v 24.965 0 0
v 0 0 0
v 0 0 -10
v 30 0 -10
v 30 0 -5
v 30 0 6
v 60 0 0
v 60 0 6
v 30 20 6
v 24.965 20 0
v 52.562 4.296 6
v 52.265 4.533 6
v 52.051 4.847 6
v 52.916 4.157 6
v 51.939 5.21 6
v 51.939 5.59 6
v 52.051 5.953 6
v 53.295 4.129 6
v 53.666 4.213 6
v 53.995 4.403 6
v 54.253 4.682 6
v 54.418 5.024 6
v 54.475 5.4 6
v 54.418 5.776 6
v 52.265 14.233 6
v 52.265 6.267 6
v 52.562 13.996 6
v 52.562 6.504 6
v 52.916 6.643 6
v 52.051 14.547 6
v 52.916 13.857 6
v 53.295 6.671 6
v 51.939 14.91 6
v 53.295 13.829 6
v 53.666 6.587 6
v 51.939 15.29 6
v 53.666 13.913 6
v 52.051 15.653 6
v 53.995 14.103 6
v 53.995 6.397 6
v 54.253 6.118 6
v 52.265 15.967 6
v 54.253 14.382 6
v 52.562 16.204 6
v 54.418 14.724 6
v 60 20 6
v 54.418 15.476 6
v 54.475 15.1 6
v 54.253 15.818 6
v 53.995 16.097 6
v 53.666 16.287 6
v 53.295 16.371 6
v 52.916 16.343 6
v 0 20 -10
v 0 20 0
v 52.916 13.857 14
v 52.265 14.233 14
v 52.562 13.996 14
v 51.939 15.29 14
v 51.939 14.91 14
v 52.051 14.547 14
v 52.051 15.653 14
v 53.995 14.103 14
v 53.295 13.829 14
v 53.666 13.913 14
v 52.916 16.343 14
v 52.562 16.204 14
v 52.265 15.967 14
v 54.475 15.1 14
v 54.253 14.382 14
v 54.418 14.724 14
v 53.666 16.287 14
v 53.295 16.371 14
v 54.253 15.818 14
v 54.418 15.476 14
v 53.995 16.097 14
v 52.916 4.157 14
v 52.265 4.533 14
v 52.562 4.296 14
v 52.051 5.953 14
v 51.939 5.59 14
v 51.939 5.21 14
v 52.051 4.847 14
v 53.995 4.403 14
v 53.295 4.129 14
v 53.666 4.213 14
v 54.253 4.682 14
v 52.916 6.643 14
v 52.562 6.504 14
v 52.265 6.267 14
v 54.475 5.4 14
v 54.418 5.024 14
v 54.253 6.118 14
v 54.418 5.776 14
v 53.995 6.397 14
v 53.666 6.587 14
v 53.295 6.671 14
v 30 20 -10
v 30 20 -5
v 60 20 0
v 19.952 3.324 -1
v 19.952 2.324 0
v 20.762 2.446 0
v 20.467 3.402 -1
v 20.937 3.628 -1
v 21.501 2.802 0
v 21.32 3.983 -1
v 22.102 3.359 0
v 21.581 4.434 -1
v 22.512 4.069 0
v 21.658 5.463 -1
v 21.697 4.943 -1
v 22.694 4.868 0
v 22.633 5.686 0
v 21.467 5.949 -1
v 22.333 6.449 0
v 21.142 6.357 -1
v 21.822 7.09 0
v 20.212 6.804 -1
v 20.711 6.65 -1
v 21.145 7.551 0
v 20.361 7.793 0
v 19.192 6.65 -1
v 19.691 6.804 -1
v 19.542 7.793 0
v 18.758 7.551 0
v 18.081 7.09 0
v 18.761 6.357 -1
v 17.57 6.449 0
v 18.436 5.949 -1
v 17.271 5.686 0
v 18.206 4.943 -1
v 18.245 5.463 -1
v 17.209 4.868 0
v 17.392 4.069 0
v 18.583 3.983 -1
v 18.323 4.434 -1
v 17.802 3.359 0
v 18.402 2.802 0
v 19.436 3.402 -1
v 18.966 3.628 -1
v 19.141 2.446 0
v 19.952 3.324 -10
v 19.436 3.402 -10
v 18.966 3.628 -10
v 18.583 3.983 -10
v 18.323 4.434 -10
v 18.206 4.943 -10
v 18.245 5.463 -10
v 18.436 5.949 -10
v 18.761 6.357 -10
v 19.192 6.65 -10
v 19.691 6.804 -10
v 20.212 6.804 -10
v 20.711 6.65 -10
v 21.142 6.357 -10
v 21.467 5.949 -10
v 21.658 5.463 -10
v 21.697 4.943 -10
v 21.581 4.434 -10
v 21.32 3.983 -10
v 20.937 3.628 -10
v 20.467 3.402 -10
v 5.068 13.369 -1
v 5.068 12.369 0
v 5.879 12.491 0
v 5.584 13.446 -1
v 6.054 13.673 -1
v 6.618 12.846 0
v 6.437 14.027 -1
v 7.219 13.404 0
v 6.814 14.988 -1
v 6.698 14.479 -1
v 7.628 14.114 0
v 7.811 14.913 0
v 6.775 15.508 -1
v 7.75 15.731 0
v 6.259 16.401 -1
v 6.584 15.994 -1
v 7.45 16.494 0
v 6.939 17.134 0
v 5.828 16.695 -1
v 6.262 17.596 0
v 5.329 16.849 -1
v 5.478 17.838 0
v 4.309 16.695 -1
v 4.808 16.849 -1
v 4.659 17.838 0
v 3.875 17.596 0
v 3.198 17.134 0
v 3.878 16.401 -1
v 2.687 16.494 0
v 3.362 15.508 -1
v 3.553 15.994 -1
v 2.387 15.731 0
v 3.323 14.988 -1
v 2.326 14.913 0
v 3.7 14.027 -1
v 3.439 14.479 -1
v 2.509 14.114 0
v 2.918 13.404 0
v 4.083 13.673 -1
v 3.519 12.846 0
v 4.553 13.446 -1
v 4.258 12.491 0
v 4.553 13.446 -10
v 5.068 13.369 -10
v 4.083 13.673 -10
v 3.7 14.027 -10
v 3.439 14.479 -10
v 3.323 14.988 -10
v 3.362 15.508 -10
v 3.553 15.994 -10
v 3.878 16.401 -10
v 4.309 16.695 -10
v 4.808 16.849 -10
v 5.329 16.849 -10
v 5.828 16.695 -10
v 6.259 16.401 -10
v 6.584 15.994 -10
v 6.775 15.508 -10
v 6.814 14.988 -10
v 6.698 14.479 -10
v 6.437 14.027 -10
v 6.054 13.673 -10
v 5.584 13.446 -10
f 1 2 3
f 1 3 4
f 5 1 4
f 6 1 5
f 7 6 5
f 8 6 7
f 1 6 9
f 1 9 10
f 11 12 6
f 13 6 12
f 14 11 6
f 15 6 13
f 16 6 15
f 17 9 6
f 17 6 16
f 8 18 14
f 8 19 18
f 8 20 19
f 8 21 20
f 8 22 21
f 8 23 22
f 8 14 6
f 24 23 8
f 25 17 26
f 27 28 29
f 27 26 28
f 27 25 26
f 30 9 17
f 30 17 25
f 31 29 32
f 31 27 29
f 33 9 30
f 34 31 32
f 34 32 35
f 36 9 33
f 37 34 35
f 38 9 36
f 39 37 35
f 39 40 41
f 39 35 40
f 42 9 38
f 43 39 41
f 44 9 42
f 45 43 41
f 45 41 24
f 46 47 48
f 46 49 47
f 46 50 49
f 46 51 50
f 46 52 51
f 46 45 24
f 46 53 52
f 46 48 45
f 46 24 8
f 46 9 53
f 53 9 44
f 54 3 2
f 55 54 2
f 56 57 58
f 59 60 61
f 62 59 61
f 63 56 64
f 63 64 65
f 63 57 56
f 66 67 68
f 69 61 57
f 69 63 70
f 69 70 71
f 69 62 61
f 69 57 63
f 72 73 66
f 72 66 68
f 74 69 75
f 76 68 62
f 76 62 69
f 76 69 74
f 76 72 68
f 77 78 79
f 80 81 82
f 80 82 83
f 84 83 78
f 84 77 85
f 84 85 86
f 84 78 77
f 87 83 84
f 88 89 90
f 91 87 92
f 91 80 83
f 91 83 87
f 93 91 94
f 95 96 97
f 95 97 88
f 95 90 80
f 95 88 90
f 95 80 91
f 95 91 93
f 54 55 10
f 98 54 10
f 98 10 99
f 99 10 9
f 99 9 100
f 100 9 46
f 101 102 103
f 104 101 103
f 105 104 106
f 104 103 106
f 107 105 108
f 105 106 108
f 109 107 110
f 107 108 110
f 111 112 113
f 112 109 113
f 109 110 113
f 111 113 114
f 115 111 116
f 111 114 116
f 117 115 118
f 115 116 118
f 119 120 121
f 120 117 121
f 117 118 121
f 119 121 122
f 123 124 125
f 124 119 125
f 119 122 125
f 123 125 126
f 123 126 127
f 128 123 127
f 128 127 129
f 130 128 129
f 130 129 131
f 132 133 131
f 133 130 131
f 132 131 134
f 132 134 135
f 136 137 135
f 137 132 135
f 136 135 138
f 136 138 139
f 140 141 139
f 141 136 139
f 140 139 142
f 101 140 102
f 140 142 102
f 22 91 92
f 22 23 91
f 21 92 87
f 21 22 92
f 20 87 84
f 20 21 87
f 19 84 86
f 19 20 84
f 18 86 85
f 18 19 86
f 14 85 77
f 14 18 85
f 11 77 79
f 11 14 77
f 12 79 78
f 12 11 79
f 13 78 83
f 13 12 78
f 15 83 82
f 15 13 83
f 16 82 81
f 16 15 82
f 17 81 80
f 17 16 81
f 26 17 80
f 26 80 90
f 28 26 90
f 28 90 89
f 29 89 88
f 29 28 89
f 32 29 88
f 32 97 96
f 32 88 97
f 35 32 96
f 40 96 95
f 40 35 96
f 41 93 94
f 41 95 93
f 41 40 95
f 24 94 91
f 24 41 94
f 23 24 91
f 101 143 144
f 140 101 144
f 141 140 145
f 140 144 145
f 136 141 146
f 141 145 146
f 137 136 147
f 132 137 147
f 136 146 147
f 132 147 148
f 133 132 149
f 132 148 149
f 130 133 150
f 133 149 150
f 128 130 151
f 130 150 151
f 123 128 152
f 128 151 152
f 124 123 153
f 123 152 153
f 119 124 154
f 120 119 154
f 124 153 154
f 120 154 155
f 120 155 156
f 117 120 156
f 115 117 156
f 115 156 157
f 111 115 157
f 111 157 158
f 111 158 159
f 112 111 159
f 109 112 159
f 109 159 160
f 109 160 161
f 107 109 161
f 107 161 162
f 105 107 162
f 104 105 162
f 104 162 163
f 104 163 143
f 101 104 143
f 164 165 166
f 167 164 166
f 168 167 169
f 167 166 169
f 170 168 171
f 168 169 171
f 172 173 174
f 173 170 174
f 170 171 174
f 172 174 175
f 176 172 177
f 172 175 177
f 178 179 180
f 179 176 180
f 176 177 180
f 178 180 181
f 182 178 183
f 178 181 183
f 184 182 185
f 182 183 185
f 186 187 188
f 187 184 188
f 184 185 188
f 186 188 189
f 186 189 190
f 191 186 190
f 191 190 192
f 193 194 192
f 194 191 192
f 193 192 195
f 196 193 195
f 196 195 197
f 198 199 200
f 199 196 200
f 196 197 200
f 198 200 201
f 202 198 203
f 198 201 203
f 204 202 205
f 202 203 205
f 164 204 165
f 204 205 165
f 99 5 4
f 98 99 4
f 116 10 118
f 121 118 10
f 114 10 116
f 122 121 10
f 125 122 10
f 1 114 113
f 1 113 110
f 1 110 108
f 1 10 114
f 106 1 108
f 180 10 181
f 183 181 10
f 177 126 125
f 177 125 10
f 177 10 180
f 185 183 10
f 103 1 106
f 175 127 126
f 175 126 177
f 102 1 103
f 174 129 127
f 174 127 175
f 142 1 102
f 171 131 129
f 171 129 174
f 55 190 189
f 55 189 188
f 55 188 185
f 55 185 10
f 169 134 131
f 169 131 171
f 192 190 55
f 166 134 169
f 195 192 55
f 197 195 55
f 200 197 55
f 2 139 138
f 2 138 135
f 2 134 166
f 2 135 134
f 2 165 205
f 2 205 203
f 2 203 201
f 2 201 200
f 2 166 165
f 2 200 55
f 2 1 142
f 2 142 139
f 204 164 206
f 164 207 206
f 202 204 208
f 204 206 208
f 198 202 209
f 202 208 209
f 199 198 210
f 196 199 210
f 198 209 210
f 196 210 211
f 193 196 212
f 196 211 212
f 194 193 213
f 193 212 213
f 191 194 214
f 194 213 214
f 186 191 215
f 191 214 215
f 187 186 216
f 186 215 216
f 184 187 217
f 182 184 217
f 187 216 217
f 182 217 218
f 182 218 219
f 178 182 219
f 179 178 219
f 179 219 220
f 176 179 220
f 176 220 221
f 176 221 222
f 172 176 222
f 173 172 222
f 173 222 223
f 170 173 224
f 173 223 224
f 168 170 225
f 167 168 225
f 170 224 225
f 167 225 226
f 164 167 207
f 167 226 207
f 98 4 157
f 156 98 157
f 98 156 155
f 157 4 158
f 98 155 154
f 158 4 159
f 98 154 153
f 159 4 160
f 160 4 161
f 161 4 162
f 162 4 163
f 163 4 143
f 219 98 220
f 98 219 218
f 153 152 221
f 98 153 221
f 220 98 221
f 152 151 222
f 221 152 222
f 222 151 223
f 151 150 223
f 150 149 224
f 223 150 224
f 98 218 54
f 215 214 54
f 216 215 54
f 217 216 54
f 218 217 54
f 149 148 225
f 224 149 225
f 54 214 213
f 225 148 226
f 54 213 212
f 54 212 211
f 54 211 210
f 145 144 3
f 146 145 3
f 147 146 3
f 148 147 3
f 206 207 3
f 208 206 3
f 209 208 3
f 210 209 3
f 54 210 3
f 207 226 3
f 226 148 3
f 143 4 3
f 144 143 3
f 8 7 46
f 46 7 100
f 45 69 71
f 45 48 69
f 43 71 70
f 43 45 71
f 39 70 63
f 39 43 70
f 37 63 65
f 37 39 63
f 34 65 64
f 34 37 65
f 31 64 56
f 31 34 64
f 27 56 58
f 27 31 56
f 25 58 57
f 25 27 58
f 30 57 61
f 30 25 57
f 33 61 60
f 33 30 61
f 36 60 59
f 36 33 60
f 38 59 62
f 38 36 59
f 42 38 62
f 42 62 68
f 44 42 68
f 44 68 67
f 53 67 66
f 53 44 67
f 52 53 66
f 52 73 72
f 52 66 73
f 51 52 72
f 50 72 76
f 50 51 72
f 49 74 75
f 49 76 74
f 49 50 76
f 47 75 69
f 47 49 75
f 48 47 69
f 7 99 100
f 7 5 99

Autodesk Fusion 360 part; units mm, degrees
sketch "Skizze1" plane through (0, 0, 0) normal (0, 0, 1) x (1, 0, 0)
  line L0 (0, 0) -> (60, 0)
  line L1 (60, 0) -> (60, 20)
  line L2 (60, 20) -> (0, 20)
  line L3 (0, 20) -> (0, 0)
  circle A0 centre (53.2, 5.4) radius 1.275
  circle A1 centre (53.2, 15.1) radius 1.275
  line L4 (0, 20) -> (30, 20)
  line L5 (30, 20) -> (30, 0)
  line L6 (30, 0) -> (0, 0)
  line L7 (0, 0) -> (0, 20)
  dimension "d1" = 60
  dimension "d2" = 20
  dimension "d3" = 2.55
  dimension "d4" = 2.55
  dimension "d5" = 5.4
  dimension "d6" = 6.8
  dimension "d7" = 4.9
  dimension "d8" = 6.8
extrude "Extrusion1" add sketch "Skizze1" along normal blind 6
extrude "Extrusion2" add sketch "Skizze1" along normal blind 14 contours A0 | A1
extrude "Extrusion3" add sketch "Skizze1" against normal blind 5 contours L0 L2 L3 L4 L5 L6 L7
sketch "Skizze2" plane through (0, 0, 0) normal (0, -1, 0) x (1, 0, 0)
  line L0 (30, 0) -> (60, 0)
  line L1 (60, 0) -> (60, 6)
  line L2 (60, 6) -> (0, 6)
  line L3 (0, 6) -> (0, -5)
  line L4 (0, -5) -> (30, -5)
  line L5 (30, -5) -> (30, 0)
  line L6 (30, -5) -> (60, 0)
  line L7 (0, 6) -> (30, 6)
  line L8 (30, 6) -> (30, 0)
  line L9 (30, 0) -> (0, 0)
  line L10 (0, 0) -> (0, 6)
  line L11 (30, 6) -> (24.9654, 0)
  line L12 (30, 6) -> (37.8324, 6) construction
  line L13 (0, -5) -> (30, -5)
  line L14 (30, -5) -> (30, -10)
  line L15 (30, -10) -> (0, -10)
  line L16 (0, -10) -> (0, -5)
  dimension "d41" = 130
  dimension "d44" = 5
extrude "Extrusion6" add sketch "Skizze2" against normal blind 20 contours L0 L5 L6
extrude "Extrusion7" cut sketch "Skizze2" against normal blind 20 contours L2 L3 L7 L9 L10 L11
extrude "Extrusion8" add sketch "Skizze2" against normal blind 20 contours L4 L13 L14 L15 L16
hole "Bohrung5" at (5.0685, 15.1186, 0) direction (0, 0, -1) diameter 3.5 depth 10 tip angle 180 countersink diameter 5.5 countersink angle 90
hole "Bohrung6" at (19.9516, 5.0738, 0) direction (0, 0, -1) diameter 3.5 depth 10 tip angle 180 countersink diameter 5.5 countersink angle 90
equation "d6 = 5.7 mm + 1.1 mm"
equation "d8 = 5.7 mm + 1.1 mm"
